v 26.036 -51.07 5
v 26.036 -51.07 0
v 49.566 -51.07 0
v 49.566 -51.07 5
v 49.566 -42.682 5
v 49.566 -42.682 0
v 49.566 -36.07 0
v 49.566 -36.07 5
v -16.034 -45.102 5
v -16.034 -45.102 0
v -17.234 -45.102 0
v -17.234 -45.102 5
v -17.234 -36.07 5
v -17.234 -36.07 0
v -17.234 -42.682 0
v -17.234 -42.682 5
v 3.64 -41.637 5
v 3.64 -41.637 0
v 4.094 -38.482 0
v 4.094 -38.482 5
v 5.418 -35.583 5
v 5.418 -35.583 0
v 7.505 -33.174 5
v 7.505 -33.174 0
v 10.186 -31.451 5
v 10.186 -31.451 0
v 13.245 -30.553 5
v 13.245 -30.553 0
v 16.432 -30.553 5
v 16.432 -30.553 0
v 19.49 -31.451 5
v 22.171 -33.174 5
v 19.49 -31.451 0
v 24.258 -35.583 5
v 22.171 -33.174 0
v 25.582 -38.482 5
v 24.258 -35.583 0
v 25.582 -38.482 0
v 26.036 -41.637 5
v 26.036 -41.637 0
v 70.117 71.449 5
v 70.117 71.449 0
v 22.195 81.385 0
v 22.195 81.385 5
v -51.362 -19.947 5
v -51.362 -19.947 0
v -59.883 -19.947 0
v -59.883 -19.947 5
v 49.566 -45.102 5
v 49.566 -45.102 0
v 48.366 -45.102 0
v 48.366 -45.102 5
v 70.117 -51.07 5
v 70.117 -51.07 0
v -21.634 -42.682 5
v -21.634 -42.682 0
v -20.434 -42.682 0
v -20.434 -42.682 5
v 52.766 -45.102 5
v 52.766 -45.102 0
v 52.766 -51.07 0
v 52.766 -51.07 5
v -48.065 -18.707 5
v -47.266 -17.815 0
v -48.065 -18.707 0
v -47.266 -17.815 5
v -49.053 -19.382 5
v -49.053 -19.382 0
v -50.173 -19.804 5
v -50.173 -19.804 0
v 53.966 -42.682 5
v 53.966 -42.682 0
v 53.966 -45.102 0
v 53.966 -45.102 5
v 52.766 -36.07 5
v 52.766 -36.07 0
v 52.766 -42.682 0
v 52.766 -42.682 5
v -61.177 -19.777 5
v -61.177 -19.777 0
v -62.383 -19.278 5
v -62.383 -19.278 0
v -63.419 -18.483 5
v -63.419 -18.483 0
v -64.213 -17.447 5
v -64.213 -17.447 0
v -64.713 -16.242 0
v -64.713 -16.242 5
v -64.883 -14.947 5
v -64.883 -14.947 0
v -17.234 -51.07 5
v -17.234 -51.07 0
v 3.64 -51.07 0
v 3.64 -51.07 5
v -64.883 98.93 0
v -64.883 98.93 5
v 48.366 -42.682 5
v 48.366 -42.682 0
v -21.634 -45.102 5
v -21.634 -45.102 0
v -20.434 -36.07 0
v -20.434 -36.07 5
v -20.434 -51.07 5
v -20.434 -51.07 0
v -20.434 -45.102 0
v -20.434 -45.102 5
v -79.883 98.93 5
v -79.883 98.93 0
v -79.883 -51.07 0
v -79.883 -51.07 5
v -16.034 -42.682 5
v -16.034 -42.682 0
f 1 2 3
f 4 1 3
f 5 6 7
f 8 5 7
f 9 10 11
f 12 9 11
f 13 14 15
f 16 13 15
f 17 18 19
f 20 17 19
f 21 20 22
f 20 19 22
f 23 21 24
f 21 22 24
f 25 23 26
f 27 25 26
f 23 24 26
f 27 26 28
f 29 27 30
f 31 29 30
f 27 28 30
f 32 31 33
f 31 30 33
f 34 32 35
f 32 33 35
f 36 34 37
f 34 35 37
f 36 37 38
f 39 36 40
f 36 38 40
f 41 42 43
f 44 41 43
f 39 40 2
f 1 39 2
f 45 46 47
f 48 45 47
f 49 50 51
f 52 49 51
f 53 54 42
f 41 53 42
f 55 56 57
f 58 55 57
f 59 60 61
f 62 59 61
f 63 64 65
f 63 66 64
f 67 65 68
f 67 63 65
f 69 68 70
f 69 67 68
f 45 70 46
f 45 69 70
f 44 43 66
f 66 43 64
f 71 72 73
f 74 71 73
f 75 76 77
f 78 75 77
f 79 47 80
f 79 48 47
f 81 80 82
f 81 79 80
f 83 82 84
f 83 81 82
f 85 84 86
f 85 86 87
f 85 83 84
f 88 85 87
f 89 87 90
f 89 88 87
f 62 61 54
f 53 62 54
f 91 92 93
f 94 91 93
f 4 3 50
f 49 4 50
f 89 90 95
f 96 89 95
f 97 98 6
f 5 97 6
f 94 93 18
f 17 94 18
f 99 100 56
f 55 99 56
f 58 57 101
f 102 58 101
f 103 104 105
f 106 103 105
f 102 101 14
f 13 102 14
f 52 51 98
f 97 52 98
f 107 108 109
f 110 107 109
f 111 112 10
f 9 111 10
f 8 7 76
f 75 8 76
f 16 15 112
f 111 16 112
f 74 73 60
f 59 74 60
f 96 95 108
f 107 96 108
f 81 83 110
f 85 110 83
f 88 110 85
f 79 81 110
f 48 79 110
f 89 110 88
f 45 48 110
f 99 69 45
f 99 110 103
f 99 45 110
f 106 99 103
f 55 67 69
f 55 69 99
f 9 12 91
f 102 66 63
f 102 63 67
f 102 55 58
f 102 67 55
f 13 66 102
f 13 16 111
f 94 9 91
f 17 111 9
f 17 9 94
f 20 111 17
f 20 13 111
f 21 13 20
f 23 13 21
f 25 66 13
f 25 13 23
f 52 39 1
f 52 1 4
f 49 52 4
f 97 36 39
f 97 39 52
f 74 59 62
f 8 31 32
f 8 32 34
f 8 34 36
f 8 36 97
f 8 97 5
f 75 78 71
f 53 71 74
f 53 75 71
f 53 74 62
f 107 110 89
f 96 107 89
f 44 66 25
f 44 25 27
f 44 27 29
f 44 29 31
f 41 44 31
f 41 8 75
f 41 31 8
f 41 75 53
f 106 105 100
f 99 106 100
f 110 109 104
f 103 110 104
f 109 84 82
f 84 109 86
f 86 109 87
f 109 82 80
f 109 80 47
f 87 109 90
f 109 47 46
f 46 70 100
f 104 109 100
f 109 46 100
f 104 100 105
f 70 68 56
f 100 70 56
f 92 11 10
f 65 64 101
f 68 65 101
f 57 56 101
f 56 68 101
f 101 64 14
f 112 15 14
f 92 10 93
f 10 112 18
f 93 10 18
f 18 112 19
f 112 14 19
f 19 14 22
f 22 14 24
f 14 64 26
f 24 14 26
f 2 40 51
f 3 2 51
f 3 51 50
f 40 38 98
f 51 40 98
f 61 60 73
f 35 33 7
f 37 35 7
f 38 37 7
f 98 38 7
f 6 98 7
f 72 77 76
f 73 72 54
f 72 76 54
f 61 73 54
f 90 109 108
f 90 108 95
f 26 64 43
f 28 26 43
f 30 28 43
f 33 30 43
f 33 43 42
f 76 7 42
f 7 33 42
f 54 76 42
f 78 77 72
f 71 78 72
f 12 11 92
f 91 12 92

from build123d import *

# Parameters (mm, degrees)
BOSS_EXTRU_1_DEPTH = 5
CONG_1_R           = 5


with BuildPart() as part:
    # Esquisse1 → Boss.-Extru.1 (new body)
    with BuildSketch(Plane.XY):
        with BuildLine():
            Line((-79.883099041, 98.930477667), (-79.883099041, -51.069522333))
            Line((-79.883099041, -51.069522333), (-20.434042124, -51.069522333))
            Line((-20.434042124, -51.069522333), (-20.434042124, -45.101662771))
            Line((-20.434042124, -45.101662771), (-21.634042124, -45.101662771))
            Line((-21.634042124, -45.101662771), (-21.634042124, -42.681662771))
            Line((-21.634042124, -42.681662771), (-20.434042124, -42.681662771))
            Line((-20.434042124, -42.681662771), (-20.434042124, -36.069522333))
            Line((-20.434042124, -36.069522333), (-17.234042124, -36.069522333))
            Line((-17.234042124, -36.069522333), (-17.234042124, -42.681662771))
            Line((-17.234042124, -42.681662771), (-16.034042124, -42.681662771))
            Line((-16.034042124, -42.681662771), (-16.034042124, -45.101662771))
            Line((-16.034042124, -45.101662771), (-17.234042124, -45.101662771))
            Line((-17.234042124, -45.101662771), (-17.234042124, -51.069522333))
            Line((-17.234042124, -51.069522333), (3.640375371, -51.069522333))
            Line((3.640375371, -51.069522333), (3.640375371, -41.637138386))
            ThreePointArc((3.640375371, -41.637138386), (14.83816479, -30.439348967), (26.035954209, -41.637138386))
            Line((26.035954209, -41.637138386), (26.035954209, -51.069522333))
            Line((26.035954209, -51.069522333), (49.565957876, -51.069522333))
            Line((49.565957876, -51.069522333), (49.565957876, -45.101662771))
            Line((49.565957876, -45.101662771), (48.365957876, -45.101662771))
            Line((48.365957876, -45.101662771), (48.365957876, -42.681662771))
            Line((48.365957876, -42.681662771), (49.565957876, -42.681662771))
            Line((49.565957876, -42.681662771), (49.565957876, -36.069522333))
            Line((49.565957876, -36.069522333), (52.765957876, -36.069522333))
            Line((52.765957876, -36.069522333), (52.765957876, -42.681662771))
            Line((52.765957876, -42.681662771), (53.965957876, -42.681662771))
            Line((53.965957876, -42.681662771), (53.965957876, -45.101662771))
            Line((53.965957876, -45.101662771), (52.765957876, -45.101662771))
            Line((52.765957876, -45.101662771), (52.765957876, -51.069522333))
            Line((52.765957876, -51.069522333), (70.116900959, -51.069522333))
            Line((70.116900959, -51.069522333), (70.116900959, -43.569522333))
            Line((70.116900959, -43.569522333), (70.116900959, 71.449147664))
            Line((70.116900959, 71.449147664), (22.19472603, 81.384794059))
            Line((22.19472603, 81.384794059), (-48.758847586, -19.947410672))
            Line((-48.758847586, -19.947410672), (-64.883099041, -19.947410672))
            Line((-64.883099041, -19.947410672), (-64.883099041, 98.930477667))
            Line((-64.883099041, 98.930477667), (-79.883099041, 98.930477667))
        make_face()
    extrude(amount=BOSS_EXTRU_1_DEPTH)

    # Congé1
    cong_1_edges = [part.edges().sort_by_distance(p)[0] for p in [
        (-64.883099041, -19.947410672, 2.5),
        (-48.758847586, -19.947410672, 2.5),
    ]]
    fillet(cong_1_edges, radius=CONG_1_R)


solid = part.part
